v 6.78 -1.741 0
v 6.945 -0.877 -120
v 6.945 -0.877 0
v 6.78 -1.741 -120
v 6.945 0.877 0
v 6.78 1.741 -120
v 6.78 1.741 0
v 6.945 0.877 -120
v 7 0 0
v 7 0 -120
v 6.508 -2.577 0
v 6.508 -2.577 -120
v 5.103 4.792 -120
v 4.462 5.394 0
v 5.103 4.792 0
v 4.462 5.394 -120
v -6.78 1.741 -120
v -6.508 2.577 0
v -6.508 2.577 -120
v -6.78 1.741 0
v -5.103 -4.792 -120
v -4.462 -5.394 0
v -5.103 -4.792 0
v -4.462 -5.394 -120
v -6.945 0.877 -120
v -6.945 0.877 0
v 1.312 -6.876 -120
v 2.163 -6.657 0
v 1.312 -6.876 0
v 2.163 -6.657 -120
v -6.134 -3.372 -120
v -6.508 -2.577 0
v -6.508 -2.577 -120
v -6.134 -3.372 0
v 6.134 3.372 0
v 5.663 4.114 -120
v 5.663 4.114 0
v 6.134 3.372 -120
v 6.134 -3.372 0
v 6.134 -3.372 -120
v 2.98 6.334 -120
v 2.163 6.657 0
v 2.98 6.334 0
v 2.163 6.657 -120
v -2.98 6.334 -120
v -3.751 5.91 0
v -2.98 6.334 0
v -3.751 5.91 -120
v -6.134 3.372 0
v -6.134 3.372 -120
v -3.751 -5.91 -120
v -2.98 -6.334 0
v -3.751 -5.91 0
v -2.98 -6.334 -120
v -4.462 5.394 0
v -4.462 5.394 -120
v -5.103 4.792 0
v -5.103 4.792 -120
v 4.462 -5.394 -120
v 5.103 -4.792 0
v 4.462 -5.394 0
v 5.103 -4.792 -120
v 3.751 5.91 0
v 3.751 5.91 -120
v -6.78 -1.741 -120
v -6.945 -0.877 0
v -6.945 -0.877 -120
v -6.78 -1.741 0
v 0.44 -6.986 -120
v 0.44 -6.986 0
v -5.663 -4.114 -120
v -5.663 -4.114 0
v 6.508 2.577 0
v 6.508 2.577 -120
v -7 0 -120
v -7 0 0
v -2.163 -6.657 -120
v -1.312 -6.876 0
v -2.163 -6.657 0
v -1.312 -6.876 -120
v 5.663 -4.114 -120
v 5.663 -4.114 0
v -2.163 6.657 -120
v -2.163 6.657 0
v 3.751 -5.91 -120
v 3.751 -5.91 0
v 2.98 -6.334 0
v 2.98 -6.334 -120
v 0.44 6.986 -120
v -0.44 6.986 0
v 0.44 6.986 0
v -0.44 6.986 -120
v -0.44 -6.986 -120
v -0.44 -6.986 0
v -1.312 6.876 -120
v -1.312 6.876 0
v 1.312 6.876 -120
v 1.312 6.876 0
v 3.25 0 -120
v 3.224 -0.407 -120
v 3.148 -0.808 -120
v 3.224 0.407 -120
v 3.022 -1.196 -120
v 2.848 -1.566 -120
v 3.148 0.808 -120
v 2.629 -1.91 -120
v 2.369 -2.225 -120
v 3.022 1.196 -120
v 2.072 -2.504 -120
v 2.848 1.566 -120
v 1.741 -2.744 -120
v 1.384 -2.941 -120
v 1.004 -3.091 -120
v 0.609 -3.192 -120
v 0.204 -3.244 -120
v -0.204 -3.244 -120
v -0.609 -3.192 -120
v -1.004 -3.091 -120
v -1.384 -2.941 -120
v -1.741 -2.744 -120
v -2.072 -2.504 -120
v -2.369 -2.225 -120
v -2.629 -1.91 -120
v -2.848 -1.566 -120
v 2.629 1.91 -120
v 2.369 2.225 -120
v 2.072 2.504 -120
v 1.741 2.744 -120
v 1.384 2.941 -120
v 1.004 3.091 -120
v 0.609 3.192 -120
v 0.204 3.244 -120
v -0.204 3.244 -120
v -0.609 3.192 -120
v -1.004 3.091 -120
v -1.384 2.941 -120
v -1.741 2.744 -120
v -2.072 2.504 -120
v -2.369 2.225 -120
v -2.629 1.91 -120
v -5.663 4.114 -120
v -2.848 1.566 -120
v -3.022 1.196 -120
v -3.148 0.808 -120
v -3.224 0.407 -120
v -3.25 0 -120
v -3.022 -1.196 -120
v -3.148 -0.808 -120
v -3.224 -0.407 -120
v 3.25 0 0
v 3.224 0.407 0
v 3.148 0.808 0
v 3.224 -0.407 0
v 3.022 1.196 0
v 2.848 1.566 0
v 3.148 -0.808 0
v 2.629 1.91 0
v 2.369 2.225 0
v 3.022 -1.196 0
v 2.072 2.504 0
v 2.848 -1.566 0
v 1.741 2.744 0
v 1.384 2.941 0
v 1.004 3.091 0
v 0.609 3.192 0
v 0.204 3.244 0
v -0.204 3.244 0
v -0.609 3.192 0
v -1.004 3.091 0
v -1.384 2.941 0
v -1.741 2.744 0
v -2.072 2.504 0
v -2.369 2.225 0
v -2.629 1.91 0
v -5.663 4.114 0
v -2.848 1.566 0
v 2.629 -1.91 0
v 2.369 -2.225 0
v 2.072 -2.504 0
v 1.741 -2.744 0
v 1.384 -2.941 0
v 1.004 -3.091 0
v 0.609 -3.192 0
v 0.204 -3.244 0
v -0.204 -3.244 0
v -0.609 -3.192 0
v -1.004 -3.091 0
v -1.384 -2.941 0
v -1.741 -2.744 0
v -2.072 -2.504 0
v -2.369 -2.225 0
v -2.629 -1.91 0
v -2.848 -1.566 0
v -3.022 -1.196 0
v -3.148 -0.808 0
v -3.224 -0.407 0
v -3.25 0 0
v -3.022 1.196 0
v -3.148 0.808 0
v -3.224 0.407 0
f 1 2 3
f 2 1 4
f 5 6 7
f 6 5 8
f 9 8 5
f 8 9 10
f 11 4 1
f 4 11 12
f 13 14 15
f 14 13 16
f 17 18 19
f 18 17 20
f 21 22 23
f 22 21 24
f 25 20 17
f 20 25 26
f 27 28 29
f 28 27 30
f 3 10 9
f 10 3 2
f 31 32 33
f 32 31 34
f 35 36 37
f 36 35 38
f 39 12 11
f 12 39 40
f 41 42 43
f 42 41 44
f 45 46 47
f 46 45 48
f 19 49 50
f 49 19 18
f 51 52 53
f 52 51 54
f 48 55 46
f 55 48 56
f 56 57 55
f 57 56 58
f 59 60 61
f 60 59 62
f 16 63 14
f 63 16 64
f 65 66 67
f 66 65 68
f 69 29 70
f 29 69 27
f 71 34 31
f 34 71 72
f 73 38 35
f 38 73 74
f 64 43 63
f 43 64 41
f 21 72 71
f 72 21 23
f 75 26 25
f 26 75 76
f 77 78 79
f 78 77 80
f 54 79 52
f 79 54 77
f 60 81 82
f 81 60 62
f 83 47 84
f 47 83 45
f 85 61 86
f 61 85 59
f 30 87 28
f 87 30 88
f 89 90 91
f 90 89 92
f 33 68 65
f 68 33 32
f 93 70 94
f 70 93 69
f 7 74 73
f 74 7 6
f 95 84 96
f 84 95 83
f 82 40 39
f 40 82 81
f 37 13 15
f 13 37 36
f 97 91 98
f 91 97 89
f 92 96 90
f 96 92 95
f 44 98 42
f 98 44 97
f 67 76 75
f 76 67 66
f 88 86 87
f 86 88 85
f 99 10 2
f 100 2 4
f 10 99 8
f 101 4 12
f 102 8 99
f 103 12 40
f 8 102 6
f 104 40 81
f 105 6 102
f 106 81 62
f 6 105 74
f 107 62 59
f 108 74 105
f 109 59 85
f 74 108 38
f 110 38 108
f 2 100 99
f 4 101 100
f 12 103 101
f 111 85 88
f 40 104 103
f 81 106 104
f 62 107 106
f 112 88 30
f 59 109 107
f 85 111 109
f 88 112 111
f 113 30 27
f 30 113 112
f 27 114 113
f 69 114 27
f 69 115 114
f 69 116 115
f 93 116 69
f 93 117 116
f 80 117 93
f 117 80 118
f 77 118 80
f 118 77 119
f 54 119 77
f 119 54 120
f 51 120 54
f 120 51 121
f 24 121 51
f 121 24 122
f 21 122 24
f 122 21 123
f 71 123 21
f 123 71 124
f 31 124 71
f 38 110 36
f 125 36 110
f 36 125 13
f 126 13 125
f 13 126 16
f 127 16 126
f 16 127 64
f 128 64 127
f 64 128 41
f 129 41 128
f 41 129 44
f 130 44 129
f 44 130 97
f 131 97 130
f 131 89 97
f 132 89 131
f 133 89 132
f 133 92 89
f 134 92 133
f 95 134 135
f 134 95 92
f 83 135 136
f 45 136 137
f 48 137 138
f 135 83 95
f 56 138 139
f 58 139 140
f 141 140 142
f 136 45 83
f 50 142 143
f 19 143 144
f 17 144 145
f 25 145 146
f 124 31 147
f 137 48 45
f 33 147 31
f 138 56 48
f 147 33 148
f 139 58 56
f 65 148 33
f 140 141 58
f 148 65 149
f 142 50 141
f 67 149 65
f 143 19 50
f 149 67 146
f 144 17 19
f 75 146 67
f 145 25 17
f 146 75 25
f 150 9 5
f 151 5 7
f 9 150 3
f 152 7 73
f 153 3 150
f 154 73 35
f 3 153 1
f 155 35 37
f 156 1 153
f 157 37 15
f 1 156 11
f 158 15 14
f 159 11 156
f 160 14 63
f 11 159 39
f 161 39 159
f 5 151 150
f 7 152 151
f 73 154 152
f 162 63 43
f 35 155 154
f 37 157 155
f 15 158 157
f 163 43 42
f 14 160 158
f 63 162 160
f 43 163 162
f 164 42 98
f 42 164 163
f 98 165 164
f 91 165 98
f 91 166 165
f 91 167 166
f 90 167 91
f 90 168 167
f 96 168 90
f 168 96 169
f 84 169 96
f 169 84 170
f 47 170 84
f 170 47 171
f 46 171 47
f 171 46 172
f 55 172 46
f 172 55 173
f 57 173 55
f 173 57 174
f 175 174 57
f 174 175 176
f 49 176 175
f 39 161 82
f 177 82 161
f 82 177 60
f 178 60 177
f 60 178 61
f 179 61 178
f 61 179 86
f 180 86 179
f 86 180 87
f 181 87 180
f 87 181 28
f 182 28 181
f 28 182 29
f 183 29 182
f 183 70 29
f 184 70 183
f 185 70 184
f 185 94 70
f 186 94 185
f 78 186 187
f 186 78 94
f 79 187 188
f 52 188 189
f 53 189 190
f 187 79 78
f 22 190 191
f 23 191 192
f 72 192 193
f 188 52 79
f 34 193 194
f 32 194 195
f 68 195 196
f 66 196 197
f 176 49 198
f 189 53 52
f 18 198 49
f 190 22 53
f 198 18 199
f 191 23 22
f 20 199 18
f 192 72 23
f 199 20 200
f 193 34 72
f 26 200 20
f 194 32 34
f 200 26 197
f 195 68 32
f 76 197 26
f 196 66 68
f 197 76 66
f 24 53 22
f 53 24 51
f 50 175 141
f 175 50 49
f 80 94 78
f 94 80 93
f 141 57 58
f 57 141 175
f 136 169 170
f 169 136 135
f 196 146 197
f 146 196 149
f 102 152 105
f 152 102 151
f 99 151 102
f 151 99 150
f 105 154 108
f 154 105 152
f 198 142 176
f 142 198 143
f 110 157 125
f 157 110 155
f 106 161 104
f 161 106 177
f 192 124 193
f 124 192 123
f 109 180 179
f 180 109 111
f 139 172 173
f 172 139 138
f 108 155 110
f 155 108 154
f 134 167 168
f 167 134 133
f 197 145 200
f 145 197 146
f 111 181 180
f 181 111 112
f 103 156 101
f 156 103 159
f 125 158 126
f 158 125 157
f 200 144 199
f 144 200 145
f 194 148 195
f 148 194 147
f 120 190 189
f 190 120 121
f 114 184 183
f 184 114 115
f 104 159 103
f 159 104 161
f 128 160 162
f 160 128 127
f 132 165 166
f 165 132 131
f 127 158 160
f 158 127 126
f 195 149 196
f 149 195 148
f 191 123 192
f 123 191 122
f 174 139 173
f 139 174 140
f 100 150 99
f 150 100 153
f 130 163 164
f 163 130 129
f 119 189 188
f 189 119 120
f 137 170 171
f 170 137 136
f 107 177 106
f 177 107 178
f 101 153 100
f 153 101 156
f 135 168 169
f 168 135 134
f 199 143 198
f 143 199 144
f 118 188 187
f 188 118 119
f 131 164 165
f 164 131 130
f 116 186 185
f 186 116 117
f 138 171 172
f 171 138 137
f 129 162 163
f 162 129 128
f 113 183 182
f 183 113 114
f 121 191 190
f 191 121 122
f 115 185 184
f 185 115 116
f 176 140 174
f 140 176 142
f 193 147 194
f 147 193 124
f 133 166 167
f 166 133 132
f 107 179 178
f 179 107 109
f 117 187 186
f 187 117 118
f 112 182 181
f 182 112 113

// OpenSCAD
$fn = 50;


difference() {
	union() {
		translate(v = [0, 0, -120.0000000000]) {
			cylinder(h = 120, r = 7.0000000000);
		}
		cylinder(h = 0, r = 13.0000000000);
	}
	union() {
		#translate(v = [0, 0, -120]) {
			cylinder(h = 120, r = 3.2500000000);
		}
	}
}
